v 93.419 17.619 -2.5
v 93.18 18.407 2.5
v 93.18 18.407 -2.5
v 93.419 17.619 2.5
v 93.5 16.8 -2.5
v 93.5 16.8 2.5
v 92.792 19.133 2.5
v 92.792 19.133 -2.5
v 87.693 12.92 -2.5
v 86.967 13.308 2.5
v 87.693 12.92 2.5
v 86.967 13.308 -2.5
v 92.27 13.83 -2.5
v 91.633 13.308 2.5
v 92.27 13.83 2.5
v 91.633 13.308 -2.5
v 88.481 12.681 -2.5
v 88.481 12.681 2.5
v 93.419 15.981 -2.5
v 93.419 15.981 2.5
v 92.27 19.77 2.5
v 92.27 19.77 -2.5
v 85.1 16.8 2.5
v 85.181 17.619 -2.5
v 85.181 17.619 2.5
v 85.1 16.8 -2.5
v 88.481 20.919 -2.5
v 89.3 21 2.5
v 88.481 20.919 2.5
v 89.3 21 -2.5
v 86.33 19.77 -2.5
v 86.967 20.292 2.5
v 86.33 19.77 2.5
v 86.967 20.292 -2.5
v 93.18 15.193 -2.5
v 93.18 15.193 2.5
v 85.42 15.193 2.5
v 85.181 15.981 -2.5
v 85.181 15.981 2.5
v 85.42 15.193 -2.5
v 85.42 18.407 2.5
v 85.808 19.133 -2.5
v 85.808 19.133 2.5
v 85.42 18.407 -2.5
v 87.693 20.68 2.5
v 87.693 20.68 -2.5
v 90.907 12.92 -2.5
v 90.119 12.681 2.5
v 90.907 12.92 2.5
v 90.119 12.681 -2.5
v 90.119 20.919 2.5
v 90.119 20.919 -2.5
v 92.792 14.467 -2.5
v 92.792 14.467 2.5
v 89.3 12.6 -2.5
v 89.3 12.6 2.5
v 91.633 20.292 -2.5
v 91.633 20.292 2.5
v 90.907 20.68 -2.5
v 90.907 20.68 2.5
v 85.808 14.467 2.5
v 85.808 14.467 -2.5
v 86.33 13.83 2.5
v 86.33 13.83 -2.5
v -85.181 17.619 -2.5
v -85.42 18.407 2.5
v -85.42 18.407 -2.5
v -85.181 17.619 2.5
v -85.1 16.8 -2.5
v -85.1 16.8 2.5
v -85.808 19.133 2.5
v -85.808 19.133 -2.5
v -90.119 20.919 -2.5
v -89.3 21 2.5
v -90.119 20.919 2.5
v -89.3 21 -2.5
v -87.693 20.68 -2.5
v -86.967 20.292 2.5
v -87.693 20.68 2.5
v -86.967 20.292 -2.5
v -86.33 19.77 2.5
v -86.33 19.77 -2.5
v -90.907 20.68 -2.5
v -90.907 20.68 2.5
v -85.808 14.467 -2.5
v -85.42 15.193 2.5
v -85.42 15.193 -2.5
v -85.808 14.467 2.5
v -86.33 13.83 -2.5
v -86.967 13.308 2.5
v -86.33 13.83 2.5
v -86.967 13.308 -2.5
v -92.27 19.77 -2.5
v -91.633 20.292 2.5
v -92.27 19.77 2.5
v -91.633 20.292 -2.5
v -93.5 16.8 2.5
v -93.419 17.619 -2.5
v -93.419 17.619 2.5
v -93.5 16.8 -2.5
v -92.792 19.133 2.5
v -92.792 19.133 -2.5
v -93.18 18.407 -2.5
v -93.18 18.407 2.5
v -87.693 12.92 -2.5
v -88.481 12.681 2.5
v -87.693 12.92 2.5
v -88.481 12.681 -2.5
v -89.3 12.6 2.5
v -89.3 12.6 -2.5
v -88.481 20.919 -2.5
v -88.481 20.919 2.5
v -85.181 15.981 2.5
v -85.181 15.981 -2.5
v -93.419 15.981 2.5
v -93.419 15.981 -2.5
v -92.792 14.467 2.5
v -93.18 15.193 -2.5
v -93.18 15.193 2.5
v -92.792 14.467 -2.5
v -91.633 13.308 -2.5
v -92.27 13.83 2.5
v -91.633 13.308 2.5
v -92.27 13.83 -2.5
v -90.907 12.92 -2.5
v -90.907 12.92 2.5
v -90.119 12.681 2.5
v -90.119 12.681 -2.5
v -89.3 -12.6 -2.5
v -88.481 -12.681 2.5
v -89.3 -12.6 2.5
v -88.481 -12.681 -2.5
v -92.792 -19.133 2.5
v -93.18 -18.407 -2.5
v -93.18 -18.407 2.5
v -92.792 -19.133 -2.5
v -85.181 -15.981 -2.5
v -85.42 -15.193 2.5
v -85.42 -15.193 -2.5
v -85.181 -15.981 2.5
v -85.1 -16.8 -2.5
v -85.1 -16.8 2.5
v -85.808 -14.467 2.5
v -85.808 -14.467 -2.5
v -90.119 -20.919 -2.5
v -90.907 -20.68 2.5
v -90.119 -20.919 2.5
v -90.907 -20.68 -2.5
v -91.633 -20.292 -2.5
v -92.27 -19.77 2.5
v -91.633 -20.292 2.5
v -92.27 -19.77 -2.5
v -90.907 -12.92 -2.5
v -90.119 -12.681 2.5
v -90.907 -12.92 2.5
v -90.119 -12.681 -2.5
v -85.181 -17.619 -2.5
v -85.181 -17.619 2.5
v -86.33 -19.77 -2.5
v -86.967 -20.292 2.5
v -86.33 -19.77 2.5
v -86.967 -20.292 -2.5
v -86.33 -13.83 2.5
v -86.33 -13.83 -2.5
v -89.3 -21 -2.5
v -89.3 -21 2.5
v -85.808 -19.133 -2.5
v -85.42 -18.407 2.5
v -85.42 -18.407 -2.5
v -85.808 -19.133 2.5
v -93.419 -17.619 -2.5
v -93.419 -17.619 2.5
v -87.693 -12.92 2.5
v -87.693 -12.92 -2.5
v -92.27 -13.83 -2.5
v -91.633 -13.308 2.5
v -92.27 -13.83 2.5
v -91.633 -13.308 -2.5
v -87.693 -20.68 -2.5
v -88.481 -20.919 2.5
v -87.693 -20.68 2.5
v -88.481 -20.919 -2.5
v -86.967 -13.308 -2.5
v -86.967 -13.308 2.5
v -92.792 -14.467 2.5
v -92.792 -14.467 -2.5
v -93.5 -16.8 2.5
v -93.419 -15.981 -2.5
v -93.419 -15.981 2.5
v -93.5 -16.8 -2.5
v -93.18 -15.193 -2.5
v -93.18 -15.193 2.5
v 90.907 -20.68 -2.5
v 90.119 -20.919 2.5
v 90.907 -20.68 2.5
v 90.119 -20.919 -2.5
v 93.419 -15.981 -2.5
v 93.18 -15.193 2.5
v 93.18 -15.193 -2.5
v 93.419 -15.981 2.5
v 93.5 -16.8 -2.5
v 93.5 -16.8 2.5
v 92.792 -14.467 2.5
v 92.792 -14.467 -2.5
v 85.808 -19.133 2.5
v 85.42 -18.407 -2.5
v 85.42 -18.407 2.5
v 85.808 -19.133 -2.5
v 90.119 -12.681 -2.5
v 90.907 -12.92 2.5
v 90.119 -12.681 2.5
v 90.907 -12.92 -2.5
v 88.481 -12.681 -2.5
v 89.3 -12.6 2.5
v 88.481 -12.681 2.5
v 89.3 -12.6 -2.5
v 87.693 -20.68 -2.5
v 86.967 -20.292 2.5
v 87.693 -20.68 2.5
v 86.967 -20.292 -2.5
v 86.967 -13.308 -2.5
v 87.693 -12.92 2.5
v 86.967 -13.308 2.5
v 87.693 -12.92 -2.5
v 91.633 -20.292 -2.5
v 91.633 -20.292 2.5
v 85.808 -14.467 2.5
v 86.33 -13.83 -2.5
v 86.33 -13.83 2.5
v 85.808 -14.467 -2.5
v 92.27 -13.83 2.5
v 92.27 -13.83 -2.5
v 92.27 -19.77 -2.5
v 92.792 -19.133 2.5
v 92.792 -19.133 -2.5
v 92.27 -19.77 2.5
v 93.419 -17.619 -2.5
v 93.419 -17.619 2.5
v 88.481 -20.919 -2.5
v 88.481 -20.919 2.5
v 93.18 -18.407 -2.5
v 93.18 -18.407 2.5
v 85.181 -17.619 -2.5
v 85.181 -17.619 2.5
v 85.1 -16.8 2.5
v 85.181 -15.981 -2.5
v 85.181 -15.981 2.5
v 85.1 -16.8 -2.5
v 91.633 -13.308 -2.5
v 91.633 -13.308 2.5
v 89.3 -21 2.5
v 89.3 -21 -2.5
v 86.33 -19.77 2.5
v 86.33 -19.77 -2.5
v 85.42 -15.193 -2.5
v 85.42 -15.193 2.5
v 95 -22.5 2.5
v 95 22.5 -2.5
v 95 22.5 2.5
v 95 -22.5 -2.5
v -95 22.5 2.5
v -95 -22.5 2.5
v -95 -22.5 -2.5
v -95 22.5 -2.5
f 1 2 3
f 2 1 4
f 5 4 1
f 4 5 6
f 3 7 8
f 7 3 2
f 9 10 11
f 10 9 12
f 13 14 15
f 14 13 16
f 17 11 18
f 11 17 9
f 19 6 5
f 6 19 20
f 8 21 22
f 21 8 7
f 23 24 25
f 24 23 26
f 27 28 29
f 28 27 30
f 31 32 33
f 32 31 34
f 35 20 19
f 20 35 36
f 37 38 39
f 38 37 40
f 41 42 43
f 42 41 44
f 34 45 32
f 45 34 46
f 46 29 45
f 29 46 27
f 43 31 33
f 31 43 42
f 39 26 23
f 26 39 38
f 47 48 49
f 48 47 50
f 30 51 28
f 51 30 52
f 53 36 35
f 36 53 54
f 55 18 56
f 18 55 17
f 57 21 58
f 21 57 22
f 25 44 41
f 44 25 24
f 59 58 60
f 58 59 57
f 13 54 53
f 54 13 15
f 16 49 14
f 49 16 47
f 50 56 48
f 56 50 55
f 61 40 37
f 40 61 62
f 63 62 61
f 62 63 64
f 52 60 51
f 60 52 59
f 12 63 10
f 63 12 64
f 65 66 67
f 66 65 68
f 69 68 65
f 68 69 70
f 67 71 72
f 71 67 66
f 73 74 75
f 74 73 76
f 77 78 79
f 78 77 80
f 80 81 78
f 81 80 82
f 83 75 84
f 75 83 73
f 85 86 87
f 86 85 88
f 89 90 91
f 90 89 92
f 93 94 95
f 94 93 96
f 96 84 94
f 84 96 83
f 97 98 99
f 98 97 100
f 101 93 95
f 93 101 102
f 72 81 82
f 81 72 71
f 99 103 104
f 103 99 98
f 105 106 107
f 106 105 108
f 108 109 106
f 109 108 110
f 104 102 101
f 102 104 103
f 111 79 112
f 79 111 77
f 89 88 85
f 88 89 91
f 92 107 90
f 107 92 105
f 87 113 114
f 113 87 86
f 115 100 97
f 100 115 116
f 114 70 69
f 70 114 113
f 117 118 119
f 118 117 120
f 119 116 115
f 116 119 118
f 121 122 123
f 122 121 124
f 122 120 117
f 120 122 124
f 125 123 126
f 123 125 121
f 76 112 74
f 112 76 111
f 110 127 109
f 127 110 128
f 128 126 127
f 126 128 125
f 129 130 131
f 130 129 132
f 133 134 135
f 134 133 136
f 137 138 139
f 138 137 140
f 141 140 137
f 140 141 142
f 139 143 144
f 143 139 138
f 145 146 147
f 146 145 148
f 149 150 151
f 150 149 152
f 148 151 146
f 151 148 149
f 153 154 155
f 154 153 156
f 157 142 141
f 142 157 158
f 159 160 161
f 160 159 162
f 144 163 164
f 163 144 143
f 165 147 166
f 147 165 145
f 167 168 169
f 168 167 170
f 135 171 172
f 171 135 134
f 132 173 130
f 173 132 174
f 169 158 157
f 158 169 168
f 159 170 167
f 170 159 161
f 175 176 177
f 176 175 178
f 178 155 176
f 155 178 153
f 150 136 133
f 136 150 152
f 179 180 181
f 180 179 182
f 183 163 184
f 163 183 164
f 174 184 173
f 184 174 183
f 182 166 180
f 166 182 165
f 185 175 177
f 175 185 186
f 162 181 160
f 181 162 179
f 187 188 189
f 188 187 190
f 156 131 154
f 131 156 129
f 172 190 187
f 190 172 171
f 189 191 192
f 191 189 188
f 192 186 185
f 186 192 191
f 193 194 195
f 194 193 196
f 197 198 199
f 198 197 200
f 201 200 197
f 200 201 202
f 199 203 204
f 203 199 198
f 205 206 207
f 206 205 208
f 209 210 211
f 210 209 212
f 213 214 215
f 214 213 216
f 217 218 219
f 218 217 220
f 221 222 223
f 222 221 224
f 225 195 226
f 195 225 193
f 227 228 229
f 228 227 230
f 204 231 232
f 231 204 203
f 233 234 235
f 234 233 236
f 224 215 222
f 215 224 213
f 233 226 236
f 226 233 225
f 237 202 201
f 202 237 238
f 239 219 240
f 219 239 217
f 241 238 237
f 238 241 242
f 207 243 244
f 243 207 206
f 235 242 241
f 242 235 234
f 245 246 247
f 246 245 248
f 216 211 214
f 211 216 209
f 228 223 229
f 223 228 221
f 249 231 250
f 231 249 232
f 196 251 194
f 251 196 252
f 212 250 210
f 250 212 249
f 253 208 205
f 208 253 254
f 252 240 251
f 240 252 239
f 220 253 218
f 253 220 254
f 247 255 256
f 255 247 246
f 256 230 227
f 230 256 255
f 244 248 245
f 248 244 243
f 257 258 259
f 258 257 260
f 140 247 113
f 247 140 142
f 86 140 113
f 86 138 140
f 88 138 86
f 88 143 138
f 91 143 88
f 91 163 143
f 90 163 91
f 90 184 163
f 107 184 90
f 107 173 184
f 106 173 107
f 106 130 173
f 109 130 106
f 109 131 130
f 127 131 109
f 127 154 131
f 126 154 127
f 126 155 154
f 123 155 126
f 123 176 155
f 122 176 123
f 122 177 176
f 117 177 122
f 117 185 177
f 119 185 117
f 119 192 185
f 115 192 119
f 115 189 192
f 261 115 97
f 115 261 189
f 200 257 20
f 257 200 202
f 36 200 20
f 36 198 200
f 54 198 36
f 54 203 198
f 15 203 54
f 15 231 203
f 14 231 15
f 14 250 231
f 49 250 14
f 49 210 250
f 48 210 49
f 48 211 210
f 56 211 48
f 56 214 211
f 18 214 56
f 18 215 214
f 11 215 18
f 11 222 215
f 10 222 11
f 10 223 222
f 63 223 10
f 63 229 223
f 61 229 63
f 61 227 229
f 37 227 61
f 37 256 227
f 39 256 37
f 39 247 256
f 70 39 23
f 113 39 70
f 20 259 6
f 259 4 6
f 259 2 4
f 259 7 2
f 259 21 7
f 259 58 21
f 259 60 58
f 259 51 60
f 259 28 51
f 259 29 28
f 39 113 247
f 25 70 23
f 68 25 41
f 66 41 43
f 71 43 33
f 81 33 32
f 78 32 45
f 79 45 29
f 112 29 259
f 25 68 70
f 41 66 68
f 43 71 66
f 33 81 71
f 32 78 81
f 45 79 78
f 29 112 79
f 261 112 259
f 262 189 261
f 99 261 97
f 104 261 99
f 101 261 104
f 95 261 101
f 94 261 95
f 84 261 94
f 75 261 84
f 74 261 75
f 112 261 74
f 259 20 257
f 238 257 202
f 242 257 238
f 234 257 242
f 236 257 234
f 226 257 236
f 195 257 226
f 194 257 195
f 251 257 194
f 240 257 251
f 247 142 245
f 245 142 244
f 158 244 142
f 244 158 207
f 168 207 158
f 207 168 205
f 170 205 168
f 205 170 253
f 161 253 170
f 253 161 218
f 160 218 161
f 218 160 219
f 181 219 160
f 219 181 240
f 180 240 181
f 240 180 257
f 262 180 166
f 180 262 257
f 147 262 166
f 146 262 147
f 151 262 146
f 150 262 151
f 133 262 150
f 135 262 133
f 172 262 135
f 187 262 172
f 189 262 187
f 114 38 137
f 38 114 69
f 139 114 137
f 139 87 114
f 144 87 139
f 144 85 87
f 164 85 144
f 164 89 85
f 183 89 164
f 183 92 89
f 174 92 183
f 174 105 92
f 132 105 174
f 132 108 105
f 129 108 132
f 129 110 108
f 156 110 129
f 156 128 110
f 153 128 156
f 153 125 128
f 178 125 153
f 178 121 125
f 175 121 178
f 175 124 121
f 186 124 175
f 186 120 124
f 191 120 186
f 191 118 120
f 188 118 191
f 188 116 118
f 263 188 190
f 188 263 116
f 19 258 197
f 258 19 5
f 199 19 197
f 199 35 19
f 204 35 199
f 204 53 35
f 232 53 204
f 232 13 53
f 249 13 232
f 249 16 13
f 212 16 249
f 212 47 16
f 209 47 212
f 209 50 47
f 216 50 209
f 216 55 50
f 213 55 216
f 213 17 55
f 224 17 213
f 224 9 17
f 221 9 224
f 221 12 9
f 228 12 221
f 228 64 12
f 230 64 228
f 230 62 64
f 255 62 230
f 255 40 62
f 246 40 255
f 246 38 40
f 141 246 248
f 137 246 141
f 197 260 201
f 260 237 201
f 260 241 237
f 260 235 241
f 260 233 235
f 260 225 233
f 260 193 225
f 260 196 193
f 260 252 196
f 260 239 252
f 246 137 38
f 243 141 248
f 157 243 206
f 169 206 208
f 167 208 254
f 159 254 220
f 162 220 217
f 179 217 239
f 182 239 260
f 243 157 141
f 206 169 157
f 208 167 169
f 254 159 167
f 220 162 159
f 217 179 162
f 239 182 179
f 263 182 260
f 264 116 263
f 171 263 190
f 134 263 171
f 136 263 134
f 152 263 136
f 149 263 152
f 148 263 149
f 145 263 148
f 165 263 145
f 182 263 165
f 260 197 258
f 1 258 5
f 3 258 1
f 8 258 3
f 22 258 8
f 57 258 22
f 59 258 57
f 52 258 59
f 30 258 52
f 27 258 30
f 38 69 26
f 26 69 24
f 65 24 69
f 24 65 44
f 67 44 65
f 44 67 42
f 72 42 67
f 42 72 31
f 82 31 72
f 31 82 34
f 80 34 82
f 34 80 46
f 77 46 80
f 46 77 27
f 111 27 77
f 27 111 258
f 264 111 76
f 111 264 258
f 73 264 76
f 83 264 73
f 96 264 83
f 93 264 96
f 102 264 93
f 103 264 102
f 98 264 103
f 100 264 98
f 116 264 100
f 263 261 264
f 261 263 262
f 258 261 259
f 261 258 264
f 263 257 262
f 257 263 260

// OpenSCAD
$fn = 32;

// ----------------------------------------------------------------------
// Corner plate 190 x 45 x 5
// 4 holes, centres taken from the edge offset
// ----------------------------------------------------------------------

// --- parameters (mm) ---
plate = [190, 45, 5];  // overall size (x, y, z)
holes = 4;             // number of holes the drawing asks for
hole_d = 8.4;          // hole diameter
edge = 5.7;            // hole centre offset from the plate edge

// --- derived feature positions (mm) ---
corner_x = plate[0] / 2 - edge;  // = 89.3   corner hole X
corner_y = plate[1] / 2 - edge;  // = 16.8   corner hole Y
feature_centers = [
  [corner_x, corner_y],
  [-corner_x, corner_y],
  [-corner_x, -corner_y],
  [corner_x, -corner_y]
];   // hole centres the loop below drills

// plate outline, every hole drilled through with the same cutters
difference() {
  cube(plate, center = true);
  for (centre = feature_centers)
    translate([centre[0], centre[1], 0])
      cylinder(d = hole_d, h = plate[2] + 2, center = true);
}
